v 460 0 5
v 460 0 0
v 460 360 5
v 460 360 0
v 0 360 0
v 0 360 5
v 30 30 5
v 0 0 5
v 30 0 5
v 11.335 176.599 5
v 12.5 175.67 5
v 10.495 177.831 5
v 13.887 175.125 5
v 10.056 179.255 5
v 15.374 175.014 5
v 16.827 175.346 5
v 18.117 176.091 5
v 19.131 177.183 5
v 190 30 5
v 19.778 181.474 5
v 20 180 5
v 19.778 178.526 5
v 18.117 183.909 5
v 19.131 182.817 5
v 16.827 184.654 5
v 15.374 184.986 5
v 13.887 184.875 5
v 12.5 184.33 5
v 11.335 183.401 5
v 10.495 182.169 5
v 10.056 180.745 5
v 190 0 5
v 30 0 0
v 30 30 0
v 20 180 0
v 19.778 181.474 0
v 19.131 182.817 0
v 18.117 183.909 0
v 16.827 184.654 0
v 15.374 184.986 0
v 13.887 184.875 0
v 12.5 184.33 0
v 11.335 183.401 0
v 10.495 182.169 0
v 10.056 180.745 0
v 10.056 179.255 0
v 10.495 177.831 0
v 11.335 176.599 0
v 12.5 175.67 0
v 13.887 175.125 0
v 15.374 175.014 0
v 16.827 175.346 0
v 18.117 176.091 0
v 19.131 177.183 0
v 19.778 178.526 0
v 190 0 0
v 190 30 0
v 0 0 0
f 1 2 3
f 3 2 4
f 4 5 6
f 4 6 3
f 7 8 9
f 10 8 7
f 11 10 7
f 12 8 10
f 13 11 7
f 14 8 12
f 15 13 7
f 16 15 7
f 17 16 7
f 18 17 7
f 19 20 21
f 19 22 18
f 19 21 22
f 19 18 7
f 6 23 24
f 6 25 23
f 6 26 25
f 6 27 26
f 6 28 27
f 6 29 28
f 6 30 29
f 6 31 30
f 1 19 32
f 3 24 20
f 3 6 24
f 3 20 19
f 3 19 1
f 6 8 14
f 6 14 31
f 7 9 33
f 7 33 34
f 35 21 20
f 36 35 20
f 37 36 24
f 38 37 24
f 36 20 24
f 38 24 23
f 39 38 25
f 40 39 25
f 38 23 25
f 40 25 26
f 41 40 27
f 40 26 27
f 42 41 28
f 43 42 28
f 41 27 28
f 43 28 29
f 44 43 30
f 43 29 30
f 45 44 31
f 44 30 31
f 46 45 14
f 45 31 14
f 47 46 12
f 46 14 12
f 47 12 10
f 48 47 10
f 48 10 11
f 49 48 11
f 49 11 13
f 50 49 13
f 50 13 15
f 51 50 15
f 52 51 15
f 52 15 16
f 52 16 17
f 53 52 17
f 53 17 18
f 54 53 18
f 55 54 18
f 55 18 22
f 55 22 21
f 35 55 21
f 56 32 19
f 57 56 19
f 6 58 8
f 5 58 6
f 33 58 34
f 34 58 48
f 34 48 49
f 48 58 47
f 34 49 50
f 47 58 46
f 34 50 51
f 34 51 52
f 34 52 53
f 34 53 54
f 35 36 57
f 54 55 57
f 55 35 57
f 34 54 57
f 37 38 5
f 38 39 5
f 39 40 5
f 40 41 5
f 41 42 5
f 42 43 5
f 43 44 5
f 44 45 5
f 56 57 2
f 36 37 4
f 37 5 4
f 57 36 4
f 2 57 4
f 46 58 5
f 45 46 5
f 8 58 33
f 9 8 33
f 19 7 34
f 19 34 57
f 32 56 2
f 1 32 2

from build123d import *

# Parameters (mm, degrees)
SKETCH_W        = 460
SKETCH_H        = 360
PAD_DEPTH       = 5
SKETCH001_R     = 5
POCKET_DEPTH    = 5.001
SKETCH002_W     = 160
SKETCH002_H     = 30
POCKET001_DEPTH = 5.001


with BuildPart() as part:
    # Sketch → Pad (new body)
    with BuildSketch(Plane.XY):
        with Locations((230, 180)):
            Rectangle(SKETCH_W, SKETCH_H)
    extrude(amount=PAD_DEPTH)

    # Sketch001 (on Face6 of Pad) → Pocket (cut, through all)
    with BuildSketch(Plane.XY.offset(5)):
        with Locations((15, 180)):
            Circle(SKETCH001_R)
    extrude(amount=-POCKET_DEPTH, mode=Mode.SUBTRACT)

    # Sketch002 (on Face5 of Pocket) → Pocket001 (cut, through all)
    with BuildSketch(Plane.XY.offset(5)):
        with Locations((110, 15)):
            Rectangle(SKETCH002_W, SKETCH002_H)
    extrude(amount=-POCKET001_DEPTH, mode=Mode.SUBTRACT)


solid = part.part
